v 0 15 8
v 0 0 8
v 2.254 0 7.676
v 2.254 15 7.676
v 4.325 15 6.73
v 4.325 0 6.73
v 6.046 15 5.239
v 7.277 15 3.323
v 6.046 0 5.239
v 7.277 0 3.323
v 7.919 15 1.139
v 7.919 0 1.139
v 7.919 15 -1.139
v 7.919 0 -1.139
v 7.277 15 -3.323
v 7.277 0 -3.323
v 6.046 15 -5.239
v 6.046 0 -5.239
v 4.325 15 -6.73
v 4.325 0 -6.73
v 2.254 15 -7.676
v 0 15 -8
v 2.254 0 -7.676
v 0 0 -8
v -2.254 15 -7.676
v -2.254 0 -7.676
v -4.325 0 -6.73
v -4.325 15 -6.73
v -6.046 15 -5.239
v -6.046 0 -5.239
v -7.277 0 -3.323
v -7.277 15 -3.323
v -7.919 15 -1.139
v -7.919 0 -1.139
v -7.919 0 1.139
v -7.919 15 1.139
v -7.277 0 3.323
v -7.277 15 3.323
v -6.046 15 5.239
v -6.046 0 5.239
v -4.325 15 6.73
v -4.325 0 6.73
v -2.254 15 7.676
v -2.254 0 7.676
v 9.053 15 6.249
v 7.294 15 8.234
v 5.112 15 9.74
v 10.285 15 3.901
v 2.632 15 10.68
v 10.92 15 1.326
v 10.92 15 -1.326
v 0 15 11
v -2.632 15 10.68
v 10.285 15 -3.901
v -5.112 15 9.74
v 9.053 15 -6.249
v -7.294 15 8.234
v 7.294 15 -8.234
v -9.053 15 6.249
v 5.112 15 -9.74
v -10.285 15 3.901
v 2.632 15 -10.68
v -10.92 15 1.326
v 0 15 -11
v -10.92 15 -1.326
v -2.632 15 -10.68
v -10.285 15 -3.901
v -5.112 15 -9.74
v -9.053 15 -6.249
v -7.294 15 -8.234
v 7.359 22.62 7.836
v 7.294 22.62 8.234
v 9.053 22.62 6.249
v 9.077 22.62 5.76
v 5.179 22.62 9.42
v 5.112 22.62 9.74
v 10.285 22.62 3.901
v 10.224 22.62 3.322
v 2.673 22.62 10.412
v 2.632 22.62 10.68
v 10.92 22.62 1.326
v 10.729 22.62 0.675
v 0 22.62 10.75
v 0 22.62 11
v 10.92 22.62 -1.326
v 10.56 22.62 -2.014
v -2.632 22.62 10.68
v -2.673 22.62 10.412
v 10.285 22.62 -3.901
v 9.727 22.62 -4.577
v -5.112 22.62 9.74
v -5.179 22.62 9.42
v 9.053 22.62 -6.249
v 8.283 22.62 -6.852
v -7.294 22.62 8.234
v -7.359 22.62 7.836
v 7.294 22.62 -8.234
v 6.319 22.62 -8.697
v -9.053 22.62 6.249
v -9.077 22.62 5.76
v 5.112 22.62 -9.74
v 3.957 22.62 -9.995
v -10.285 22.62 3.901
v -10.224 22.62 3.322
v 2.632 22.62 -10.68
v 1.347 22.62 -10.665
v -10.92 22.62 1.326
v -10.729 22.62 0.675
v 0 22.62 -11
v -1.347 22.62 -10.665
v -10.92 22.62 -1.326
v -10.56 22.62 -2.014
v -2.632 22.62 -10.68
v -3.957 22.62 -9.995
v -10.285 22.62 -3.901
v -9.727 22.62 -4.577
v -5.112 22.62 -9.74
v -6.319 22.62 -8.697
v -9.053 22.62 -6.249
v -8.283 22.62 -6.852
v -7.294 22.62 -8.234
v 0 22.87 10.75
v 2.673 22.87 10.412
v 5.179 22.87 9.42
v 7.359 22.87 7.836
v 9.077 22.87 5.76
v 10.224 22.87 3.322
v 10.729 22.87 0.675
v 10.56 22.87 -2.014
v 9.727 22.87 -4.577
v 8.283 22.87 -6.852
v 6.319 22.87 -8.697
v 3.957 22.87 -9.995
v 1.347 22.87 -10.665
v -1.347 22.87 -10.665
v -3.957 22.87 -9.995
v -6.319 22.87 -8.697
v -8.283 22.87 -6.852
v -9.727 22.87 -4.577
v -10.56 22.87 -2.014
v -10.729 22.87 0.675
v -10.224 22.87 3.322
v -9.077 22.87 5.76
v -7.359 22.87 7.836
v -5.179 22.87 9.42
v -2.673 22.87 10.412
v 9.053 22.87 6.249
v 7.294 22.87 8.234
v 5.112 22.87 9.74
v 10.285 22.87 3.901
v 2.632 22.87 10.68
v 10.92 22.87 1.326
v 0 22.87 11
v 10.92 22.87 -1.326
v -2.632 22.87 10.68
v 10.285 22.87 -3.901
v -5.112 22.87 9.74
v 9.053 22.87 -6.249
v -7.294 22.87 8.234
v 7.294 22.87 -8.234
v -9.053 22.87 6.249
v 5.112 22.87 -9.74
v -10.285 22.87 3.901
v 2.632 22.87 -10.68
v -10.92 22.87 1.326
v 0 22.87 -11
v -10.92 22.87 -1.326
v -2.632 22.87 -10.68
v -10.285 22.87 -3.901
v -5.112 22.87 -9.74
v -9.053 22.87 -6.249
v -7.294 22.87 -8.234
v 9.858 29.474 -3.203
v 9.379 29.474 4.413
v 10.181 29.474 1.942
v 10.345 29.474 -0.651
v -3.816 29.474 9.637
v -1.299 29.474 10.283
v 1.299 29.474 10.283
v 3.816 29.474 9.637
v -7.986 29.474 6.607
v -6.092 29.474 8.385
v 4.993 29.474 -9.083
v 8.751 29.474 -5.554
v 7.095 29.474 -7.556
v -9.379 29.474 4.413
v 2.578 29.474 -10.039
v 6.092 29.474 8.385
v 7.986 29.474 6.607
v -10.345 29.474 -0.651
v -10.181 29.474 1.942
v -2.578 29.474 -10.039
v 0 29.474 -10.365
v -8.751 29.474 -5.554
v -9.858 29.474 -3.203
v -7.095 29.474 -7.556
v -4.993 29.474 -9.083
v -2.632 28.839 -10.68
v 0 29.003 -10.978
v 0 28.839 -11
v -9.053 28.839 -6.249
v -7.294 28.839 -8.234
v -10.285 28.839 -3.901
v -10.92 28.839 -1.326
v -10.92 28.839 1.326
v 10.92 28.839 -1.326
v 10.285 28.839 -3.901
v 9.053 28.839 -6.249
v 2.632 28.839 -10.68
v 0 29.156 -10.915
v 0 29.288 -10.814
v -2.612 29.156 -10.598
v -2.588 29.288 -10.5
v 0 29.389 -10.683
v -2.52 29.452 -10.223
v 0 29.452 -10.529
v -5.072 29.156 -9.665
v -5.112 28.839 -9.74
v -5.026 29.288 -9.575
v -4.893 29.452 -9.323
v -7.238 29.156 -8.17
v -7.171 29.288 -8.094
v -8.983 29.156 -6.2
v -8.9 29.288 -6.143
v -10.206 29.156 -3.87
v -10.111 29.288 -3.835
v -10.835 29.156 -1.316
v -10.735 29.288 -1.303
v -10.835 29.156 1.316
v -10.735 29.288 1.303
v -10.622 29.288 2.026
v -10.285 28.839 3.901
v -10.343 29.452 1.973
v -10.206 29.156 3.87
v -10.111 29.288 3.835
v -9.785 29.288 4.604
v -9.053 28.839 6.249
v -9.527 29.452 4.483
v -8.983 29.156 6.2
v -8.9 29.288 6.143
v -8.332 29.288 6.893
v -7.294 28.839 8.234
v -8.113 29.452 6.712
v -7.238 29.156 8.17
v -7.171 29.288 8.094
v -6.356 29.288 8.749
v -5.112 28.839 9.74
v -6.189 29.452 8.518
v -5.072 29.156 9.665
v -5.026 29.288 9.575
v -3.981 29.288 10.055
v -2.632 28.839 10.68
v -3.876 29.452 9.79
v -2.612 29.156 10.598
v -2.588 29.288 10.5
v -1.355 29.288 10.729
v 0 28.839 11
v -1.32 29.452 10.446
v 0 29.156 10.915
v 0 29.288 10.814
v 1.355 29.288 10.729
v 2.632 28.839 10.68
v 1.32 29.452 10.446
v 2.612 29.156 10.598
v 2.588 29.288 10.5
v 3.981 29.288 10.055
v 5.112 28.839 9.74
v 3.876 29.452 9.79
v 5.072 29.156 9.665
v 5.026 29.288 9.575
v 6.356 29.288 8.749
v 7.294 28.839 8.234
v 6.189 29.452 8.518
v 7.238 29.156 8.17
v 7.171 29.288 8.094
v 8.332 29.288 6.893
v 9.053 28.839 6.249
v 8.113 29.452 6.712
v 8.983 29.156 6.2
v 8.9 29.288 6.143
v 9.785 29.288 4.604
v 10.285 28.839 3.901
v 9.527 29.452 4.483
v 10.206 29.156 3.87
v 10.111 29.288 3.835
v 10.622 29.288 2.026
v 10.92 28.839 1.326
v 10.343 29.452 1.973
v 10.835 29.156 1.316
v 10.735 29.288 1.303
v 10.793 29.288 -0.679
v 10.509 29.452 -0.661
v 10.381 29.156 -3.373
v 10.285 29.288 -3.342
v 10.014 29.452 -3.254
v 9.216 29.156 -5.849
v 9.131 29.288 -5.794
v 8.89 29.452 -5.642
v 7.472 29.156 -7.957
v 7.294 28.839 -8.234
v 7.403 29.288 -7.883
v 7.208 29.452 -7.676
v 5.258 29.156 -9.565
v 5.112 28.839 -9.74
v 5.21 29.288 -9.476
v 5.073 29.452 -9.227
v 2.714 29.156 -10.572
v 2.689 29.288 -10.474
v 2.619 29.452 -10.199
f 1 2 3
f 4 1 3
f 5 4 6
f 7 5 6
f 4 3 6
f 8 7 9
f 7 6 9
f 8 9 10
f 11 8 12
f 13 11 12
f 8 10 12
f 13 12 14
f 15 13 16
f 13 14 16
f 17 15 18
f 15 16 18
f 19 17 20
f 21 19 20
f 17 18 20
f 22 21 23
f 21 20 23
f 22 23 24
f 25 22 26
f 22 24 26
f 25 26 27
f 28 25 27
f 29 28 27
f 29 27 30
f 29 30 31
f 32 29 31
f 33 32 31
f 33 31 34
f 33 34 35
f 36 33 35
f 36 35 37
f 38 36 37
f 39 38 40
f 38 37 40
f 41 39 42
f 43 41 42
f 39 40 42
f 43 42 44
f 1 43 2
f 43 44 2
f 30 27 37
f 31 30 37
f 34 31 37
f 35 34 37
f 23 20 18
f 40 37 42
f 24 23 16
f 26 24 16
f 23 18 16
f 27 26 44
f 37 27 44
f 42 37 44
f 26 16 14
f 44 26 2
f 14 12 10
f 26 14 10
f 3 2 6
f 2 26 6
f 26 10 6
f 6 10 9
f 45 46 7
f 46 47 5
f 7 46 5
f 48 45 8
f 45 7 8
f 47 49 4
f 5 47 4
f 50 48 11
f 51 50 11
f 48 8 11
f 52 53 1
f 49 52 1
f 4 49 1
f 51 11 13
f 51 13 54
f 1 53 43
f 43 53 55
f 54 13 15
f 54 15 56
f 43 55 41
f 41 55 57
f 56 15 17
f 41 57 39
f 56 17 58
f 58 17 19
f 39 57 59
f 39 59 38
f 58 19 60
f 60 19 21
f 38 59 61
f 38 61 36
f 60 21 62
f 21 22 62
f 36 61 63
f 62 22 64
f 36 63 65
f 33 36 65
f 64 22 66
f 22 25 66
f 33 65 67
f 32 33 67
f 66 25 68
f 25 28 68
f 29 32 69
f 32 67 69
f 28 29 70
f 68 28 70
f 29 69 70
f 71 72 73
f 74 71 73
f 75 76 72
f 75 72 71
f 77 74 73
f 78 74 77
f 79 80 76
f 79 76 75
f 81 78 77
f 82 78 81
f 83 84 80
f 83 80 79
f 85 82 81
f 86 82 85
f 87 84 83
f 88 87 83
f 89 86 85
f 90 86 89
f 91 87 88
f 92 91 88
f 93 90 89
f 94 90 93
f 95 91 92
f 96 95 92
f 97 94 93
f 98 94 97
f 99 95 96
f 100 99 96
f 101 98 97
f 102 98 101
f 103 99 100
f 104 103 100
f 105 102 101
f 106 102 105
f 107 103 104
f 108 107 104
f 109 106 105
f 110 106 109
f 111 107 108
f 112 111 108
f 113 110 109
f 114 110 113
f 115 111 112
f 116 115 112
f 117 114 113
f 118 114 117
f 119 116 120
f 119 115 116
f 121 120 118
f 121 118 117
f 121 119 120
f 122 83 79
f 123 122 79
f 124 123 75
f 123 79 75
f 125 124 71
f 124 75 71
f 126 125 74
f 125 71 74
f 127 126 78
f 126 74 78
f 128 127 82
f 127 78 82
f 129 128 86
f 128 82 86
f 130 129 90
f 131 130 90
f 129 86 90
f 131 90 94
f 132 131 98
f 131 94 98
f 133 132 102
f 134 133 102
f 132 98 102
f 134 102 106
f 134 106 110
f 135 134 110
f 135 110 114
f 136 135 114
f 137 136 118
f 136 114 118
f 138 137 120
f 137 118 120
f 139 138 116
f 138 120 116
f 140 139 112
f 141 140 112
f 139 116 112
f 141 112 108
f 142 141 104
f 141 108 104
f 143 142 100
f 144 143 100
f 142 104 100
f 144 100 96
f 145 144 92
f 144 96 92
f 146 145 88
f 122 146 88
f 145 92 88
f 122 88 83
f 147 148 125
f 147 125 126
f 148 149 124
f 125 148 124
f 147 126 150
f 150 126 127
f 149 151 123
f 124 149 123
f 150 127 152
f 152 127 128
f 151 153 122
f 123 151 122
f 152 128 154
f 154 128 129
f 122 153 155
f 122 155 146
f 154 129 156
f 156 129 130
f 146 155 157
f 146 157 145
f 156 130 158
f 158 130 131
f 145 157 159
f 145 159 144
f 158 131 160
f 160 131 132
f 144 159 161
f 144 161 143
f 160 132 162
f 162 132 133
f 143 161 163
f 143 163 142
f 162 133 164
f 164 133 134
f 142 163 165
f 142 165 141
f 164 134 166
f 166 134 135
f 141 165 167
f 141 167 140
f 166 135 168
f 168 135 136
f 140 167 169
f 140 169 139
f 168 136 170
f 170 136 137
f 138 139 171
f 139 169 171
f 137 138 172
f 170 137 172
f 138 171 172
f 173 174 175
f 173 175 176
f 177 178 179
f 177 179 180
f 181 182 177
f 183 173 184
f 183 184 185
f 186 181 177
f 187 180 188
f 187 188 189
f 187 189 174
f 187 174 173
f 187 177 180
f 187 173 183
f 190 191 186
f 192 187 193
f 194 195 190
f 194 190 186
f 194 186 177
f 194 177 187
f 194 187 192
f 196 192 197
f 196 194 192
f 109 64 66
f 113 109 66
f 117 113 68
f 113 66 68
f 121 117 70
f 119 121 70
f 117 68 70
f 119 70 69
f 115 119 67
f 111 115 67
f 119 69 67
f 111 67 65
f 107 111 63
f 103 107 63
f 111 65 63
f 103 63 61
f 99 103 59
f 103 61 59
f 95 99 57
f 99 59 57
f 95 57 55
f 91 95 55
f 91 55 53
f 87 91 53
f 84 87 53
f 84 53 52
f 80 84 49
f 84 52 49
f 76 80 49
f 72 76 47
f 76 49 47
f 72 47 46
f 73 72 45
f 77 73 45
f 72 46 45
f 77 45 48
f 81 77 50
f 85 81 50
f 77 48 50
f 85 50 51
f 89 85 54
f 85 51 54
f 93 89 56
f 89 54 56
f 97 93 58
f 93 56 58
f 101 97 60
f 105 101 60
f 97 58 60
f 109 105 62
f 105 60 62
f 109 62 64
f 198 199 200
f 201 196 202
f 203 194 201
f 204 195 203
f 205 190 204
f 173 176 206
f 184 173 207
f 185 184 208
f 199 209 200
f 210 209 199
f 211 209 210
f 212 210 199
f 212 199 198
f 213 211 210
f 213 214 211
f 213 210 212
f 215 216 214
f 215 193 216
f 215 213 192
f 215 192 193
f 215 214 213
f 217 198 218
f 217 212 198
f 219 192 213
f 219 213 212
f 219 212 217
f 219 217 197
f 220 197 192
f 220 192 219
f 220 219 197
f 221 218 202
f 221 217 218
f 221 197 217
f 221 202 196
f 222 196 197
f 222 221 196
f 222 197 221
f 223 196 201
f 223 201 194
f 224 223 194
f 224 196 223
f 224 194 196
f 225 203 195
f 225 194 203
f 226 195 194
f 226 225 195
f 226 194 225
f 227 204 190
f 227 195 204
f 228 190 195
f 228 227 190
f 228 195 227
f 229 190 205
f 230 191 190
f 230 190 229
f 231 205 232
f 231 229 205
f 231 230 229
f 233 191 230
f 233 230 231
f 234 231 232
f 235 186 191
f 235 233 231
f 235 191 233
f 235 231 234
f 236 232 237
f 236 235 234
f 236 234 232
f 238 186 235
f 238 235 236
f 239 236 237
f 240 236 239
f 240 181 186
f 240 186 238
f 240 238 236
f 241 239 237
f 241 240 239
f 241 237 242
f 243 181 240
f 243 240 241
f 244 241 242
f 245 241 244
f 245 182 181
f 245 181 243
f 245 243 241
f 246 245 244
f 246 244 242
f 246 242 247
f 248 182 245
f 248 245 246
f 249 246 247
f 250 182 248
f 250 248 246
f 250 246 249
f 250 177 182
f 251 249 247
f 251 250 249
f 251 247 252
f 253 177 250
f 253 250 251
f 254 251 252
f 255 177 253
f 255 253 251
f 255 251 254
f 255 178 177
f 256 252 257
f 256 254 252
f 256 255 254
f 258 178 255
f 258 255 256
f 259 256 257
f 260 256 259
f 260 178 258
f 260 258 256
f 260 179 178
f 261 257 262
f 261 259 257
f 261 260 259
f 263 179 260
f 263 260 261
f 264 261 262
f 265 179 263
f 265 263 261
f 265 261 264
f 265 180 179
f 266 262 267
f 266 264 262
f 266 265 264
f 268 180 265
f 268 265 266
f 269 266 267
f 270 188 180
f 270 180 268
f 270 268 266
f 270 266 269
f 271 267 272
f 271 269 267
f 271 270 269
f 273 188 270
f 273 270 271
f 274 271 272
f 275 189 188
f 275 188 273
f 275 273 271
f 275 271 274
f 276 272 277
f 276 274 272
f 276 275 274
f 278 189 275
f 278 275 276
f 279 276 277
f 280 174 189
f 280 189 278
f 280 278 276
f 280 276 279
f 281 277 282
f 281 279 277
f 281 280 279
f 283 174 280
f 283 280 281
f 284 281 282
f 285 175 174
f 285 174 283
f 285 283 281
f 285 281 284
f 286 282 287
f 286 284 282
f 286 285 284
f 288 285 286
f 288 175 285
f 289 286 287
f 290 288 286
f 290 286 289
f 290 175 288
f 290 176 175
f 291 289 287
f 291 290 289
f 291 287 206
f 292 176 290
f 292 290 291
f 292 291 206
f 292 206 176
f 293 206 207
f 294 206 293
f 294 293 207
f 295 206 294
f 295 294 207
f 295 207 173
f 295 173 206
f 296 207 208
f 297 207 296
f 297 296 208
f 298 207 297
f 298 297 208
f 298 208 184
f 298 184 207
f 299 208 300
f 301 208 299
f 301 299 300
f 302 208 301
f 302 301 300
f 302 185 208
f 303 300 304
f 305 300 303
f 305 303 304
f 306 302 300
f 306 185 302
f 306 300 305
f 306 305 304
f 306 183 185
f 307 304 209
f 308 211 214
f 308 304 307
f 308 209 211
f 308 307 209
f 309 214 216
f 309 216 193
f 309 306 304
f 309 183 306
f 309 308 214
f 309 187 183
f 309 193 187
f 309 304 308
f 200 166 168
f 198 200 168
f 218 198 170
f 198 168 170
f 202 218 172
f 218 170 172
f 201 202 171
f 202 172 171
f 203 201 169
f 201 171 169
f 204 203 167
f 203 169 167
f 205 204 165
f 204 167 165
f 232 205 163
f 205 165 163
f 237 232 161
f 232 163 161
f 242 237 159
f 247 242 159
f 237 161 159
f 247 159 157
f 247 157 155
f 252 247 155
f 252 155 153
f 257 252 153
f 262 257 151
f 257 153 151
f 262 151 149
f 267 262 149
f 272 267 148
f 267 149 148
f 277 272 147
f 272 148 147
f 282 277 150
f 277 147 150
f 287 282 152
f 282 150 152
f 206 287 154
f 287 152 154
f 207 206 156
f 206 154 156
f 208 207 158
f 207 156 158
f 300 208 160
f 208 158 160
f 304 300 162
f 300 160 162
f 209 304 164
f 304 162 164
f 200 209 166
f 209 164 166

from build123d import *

# Parameters (mm, degrees)
SKETCH1_R      = 8
EXTRUDE1_DEPTH = 15
SKETCH2_R      = 11
EXTRUDE2_DEPTH = 7.62
SKETCH3_R      = 10.75
EXTRUDE3_DEPTH = 0.25
SKETCH4_R      = 11
EXTRUDE4_DEPTH = 6.604
FILLET1_R      = 0.635


with BuildPart() as part:
    # Sketch1 → Extrude1 (new body)
    with BuildSketch(Plane(origin=(0, 0, 0), x_dir=(1, 0, 0), z_dir=(0, 1, 0))):
        with Locations(Location((0, 0, 0), (0, 0, 270))):
            Circle(SKETCH1_R)
    extrude(amount=EXTRUDE1_DEPTH)

    # Sketch2 → Extrude2 (add)
    with BuildSketch(Plane(origin=(0, 15, 0), x_dir=(-1, 0, 0), z_dir=(0, 1, 0))):
        with Locations(Location((0, 0, 0), (0, 0, 270))):
            Circle(SKETCH2_R)
    extrude(amount=EXTRUDE2_DEPTH)

    # Sketch3 → Extrude3 (add)
    with BuildSketch(Plane(origin=(0, 22.62, 0), x_dir=(-1, 0, 0), z_dir=(0, 1, 0))):
        with Locations(Location((0, 0, 0), (0, 0, 90))):
            Circle(SKETCH3_R)
    extrude(amount=EXTRUDE3_DEPTH)

    # Sketch4 → Extrude4 (add)
    with BuildSketch(Plane(origin=(0, 22.87, 0), x_dir=(-1, 0, 0), z_dir=(0, 1, 0))):
        with Locations(Location((0, 0, 0), (0, 0, 270))):
            Circle(SKETCH4_R)
    extrude(amount=EXTRUDE4_DEPTH)

    # Fillet1
    fillet1_edges = [part.edges().sort_by_distance(p)[0] for p in [
        (0, 29.474, 11),
    ]]
    fillet(fillet1_edges, radius=FILLET1_R)


solid = part.part
